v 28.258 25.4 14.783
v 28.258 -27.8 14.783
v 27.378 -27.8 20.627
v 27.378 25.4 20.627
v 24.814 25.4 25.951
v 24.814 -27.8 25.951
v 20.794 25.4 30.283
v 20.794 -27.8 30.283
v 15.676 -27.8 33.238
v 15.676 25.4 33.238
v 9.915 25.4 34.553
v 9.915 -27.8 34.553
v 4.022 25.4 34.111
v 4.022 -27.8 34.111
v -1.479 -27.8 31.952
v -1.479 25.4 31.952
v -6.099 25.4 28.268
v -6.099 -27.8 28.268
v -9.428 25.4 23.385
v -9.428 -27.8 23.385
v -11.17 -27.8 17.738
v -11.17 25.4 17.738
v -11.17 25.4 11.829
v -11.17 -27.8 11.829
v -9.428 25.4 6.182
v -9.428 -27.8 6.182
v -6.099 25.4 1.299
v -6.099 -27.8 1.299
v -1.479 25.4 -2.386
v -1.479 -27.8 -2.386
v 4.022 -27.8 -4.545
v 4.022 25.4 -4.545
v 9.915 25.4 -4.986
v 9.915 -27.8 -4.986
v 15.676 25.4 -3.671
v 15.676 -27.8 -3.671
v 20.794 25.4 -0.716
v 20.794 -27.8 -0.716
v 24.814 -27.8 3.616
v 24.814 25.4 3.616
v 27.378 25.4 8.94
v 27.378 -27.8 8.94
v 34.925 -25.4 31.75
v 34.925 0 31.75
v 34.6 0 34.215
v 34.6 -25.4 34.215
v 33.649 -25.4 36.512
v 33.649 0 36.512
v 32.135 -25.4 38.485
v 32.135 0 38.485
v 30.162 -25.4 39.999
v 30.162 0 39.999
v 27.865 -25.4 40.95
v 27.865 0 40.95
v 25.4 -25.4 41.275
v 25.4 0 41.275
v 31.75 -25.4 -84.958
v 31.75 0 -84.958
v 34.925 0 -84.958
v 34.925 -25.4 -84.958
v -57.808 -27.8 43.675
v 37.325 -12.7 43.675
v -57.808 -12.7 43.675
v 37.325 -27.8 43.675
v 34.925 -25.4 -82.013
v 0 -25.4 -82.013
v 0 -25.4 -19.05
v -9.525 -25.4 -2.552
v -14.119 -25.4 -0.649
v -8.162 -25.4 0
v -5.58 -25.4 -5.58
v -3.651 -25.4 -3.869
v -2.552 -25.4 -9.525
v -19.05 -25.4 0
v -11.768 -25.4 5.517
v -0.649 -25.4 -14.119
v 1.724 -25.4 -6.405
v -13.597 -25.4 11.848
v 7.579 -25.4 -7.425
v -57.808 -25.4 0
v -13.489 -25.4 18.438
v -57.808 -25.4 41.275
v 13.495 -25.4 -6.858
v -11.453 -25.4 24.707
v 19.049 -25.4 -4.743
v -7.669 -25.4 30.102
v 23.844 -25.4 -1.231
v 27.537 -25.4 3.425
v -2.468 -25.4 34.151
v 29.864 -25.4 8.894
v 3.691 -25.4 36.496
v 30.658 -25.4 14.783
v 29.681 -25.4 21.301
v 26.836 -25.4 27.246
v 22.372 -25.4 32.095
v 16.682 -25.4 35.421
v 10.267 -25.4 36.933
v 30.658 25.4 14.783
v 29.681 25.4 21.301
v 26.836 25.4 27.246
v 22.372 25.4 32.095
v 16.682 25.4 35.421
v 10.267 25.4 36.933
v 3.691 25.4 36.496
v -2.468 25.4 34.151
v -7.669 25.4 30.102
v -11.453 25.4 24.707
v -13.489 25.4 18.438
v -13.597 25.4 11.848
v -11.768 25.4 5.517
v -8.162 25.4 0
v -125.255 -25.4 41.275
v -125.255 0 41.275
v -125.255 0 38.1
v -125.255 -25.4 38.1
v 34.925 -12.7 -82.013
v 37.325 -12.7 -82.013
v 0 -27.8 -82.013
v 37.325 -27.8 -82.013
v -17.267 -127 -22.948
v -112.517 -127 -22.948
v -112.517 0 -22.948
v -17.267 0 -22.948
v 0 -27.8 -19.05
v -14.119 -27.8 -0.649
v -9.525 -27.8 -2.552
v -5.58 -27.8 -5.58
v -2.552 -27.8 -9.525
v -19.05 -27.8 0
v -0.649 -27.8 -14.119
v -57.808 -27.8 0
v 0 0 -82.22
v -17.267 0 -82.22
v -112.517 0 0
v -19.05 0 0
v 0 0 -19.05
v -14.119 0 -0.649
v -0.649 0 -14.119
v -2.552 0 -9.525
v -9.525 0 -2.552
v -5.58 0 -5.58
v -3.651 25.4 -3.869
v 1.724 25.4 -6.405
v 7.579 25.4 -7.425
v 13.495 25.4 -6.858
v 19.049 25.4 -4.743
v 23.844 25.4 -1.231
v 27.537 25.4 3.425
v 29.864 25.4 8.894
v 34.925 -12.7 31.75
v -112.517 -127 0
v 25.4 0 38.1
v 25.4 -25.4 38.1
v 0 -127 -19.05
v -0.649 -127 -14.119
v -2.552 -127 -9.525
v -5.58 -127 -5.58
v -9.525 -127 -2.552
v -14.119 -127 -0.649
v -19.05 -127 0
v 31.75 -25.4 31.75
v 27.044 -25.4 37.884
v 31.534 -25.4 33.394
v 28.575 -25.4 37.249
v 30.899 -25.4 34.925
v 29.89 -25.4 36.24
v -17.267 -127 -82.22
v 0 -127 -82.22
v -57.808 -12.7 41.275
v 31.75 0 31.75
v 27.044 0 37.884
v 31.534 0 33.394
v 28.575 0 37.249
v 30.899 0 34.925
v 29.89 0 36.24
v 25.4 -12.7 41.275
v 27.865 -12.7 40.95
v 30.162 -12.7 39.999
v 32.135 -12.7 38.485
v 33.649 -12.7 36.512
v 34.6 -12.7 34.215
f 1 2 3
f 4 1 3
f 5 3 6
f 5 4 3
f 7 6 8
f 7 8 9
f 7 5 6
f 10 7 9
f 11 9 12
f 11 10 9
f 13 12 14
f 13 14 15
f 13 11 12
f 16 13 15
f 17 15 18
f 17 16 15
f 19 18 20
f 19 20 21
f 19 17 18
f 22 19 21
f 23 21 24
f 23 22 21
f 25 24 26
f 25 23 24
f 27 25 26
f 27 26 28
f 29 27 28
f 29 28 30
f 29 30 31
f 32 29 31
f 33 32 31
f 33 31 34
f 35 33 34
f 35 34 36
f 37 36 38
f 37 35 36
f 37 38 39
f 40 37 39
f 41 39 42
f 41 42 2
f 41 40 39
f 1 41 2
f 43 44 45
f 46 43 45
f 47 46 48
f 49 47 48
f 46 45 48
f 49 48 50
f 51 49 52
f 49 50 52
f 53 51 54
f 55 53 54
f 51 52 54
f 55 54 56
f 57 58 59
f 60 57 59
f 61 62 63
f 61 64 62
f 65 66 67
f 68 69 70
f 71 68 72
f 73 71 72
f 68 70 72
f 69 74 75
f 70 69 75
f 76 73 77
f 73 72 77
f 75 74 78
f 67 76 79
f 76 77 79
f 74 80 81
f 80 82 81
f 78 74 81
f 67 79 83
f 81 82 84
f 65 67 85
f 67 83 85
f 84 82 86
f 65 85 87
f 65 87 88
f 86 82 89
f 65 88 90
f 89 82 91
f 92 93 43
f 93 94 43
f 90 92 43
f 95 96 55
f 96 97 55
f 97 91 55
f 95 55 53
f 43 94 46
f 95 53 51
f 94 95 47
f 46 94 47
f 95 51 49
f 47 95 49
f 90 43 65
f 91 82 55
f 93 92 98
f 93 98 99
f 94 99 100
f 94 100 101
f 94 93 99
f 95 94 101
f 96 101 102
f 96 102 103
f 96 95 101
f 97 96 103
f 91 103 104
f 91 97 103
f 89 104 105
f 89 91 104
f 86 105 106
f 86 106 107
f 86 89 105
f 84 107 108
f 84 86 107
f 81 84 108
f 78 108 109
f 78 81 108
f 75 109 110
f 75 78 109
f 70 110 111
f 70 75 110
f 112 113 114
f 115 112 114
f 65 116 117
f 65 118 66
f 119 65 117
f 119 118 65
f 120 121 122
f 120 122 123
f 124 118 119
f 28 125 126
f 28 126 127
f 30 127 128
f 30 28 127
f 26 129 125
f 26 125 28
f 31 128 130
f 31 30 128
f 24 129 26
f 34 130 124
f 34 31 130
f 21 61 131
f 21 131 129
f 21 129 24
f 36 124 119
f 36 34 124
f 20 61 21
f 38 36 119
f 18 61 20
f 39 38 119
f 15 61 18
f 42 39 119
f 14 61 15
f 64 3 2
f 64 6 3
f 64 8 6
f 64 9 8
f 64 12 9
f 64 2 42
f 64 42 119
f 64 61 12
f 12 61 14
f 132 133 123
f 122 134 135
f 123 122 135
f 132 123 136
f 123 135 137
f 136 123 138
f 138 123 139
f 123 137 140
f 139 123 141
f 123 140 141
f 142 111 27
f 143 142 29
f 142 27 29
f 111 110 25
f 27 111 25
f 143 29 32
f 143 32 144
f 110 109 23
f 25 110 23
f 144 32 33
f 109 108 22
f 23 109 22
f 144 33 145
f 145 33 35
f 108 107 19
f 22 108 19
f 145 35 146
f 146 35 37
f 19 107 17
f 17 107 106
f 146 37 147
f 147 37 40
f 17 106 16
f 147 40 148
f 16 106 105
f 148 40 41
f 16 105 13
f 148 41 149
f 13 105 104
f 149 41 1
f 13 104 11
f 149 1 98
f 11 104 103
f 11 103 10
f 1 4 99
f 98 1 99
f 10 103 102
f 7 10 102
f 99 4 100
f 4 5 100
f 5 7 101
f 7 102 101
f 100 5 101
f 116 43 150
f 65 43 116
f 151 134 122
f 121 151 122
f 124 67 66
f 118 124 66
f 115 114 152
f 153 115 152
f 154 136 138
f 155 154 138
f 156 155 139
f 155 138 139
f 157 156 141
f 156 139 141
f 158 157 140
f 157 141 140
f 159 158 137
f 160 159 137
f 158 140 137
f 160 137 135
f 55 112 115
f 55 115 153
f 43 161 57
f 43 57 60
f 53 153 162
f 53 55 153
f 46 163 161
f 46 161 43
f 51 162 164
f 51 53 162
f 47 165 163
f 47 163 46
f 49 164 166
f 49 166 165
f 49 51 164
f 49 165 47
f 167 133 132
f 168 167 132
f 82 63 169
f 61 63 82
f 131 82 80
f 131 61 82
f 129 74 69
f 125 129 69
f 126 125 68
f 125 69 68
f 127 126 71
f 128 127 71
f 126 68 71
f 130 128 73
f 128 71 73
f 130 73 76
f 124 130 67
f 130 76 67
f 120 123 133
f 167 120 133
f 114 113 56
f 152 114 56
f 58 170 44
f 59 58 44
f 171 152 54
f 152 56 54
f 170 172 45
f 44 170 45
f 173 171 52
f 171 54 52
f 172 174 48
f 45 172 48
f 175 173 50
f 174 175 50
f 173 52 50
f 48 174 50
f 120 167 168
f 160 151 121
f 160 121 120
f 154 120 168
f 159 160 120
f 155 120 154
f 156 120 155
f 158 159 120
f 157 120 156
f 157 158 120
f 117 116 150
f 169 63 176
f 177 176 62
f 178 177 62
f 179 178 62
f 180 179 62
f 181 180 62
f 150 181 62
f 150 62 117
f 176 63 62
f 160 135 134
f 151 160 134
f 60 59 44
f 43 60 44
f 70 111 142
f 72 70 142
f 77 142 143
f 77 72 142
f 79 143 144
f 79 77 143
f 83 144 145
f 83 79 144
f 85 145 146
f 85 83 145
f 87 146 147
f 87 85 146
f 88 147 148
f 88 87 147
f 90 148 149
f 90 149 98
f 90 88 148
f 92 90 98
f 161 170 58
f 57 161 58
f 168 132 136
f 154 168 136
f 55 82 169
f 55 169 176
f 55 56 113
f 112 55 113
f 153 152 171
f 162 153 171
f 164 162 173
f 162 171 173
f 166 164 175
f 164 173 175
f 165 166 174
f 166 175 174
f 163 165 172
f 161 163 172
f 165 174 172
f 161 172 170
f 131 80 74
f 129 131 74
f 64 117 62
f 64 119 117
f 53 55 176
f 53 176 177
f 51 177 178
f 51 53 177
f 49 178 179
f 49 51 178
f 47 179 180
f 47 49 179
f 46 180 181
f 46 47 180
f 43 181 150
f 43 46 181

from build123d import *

# Parameters (mm, degrees)
F1_DEPTH = 127
F2_DEPTH = 25.4
F4_DEPTH = 2.4
F3_R     = 19.825
F5_DEPTH = 2.4
F6_DEPTH = 50.8
F7_DEPTH = 12.7


# Not quite as in the source:
# - a length typed as a fraction of an inch, garbled in the dataset ("3 / 203.2 mm" for 3/8 in), is restored


with BuildPart() as f1:
    # F0 (on Front) → F1 (new body)
    with BuildSketch(Plane.XZ):
        with BuildLine():
            Line((0, -82.2203159332), (0, -19.05))
            ThreePointArc((0, -19.05), (-5.5796158184, -5.5796158184), (-19.05, 0))
            Line((-19.05, 0), (-112.5172227621, 0))
            Line((-112.5172227621, 0), (-112.5172227621, -22.9479763657))
            Line((-112.5172227621, -22.9479763657), (-17.2673482448, -22.9479763657))
            Line((-17.2673482448, -22.9479763657), (-17.2673482448, -82.2203159332))
            Line((-17.2673482448, -82.2203159332), (0, -82.2203159332))
        make_face()
    extrude(amount=F1_DEPTH)


with BuildPart() as f2:
    # F0 (on Front) → F2 (new body)
    with BuildSketch(Plane.XZ):
        with BuildLine():
            Line((-125.2552419901, 41.275), (-125.2552419901, 38.1))
            Line((-125.2552419901, 38.1), (25.4, 38.1))
            ThreePointArc((25.4, 38.1), (29.8901280605, 36.2401280605), (31.75, 31.75))
            Line((31.75, 31.75), (31.75, -84.9583235416))
            Line((31.75, -84.9583235416), (34.925, -84.9583235416))
            Line((34.925, -84.9583235416), (34.925, 31.75))
            ThreePointArc((34.925, 31.75), (32.1351920908, 38.4851920908), (25.4, 41.275))
            Line((25.4, 41.275), (-125.2552419901, 41.275))
        make_face()
    extrude(amount=F2_DEPTH)


with BuildPart() as f4:
    # F3 (on face) → F4 (new body)
    with BuildSketch(Plane.XZ.offset(25.4)):
        with BuildLine():
            ThreePointArc((-8.1618525748, 0), (0.5238571529, 35.5533174442), (30.6583888685, 14.7833888685))
            ThreePointArc((30.6583888685, 14.7833888685), (20.8131820291, -3.6744372847), (0, -5.7794070793))
            Line((0, -5.7794070793), (0, -19.05))
            Line((0, -19.05), (0, -82.0128545165))
            Line((0, -82.0128545165), (31.75, -82.0128545165))
            Line((31.75, -82.0128545165), (31.75, 31.75))
            ThreePointArc((31.75, 31.75), (29.8901280605, 36.2401280605), (25.4, 38.1))
            Line((25.4, 38.1), (-57.8078702092, 38.1))
            Line((-57.8078702092, 38.1), (-57.8078702092, 0))
            Line((-57.8078702092, 0), (-19.05, 0))
            Line((-19.05, 0), (-8.1618525748, 0))
        make_face()
        with BuildLine():
            ThreePointArc((0, -5.7794070793), (-4.4102270697, -3.3547520128), (-8.1618525748, 0))
            Line((-8.1618525748, 0), (-19.05, 0))
            ThreePointArc((-19.05, 0), (-5.5796158184, -5.5796158184), (0, -19.05))
            Line((0, -19.05), (0, -5.7794070793))
        make_face()
        with BuildLine():
            Line((-57.8078702092, 41.275), (-57.8078702092, 38.1))
            Line((-57.8078702092, 38.1), (25.4, 38.1))
            ThreePointArc((25.4, 38.1), (29.8901280605, 36.2401280605), (31.75, 31.75))
            Line((31.75, 31.75), (31.75, -82.0128545165))
            Line((31.75, -82.0128545165), (34.925, -82.0128545165))
            Line((34.925, -82.0128545165), (34.925, 31.75))
            ThreePointArc((34.925, 31.75), (32.1351920908, 38.4851920908), (25.4, 41.275))
            Line((25.4, 41.275), (-57.8078702092, 41.275))
        make_face()
        with BuildLine():
            Line((-57.8078702092, 43.675), (-57.8078702092, 41.275))
            Line((-57.8078702092, 41.275), (25.4, 41.275))
            ThreePointArc((25.4, 41.275), (32.1351920908, 38.4851920908), (34.925, 31.75))
            Line((34.925, 31.75), (34.925, -82.0128545165))
            Line((34.925, -82.0128545165), (37.325, -82.0128545165))
            Line((37.325, -82.0128545165), (37.325, 43.675))
            Line((37.325, 43.675), (-57.8078702092, 43.675))
        make_face()
    extrude(amount=F4_DEPTH)

    # F3 (on face) → F5 (join, through all)
    with BuildSketch(Plane.XZ.offset(25.4)):
        with BuildLine():
            ThreePointArc((0, -5.7794070793), (20.8131820291, -3.6744372847), (30.6583888685, 14.7833888685))
            ThreePointArc((30.6583888685, 14.7833888685), (0.5238571529, 35.5533174442), (-8.1618525748, 0))
            ThreePointArc((-8.1618525748, 0), (-4.4102270697, -3.3547520128), (0, -5.7794070793))
        make_face()
        with Locations((8.4333888685, 14.7833888685)):
            Circle(F3_R, mode=Mode.SUBTRACT)
    extrude(amount=F5_DEPTH)

    # F3 (on face) → F6 (join)
    with BuildSketch(Plane.XZ.offset(25.4)):
        with BuildLine():
            ThreePointArc((0, -5.7794070793), (20.8131820291, -3.6744372847), (30.6583888685, 14.7833888685))
            ThreePointArc((30.6583888685, 14.7833888685), (0.5238571529, 35.5533174442), (-8.1618525748, 0))
            ThreePointArc((-8.1618525748, 0), (-4.4102270697, -3.3547520128), (0, -5.7794070793))
        make_face()
        with Locations((8.4333888685, 14.7833888685)):
            Circle(F3_R, mode=Mode.SUBTRACT)
    extrude(amount=-F6_DEPTH)

    # F3 (on face) → F7 (join)
    with BuildSketch(Plane.XZ.offset(25.4)):
        with BuildLine():
            Line((-57.8078702092, 43.675), (-57.8078702092, 41.275))
            Line((-57.8078702092, 41.275), (25.4, 41.275))
            ThreePointArc((25.4, 41.275), (32.1351920908, 38.4851920908), (34.925, 31.75))
            Line((34.925, 31.75), (34.925, -82.0128545165))
            Line((34.925, -82.0128545165), (37.325, -82.0128545165))
            Line((37.325, -82.0128545165), (37.325, 43.675))
            Line((37.325, 43.675), (-57.8078702092, 43.675))
        make_face()
    extrude(amount=-F7_DEPTH)


solid = Compound([f1.part, f2.part, f4.part])
